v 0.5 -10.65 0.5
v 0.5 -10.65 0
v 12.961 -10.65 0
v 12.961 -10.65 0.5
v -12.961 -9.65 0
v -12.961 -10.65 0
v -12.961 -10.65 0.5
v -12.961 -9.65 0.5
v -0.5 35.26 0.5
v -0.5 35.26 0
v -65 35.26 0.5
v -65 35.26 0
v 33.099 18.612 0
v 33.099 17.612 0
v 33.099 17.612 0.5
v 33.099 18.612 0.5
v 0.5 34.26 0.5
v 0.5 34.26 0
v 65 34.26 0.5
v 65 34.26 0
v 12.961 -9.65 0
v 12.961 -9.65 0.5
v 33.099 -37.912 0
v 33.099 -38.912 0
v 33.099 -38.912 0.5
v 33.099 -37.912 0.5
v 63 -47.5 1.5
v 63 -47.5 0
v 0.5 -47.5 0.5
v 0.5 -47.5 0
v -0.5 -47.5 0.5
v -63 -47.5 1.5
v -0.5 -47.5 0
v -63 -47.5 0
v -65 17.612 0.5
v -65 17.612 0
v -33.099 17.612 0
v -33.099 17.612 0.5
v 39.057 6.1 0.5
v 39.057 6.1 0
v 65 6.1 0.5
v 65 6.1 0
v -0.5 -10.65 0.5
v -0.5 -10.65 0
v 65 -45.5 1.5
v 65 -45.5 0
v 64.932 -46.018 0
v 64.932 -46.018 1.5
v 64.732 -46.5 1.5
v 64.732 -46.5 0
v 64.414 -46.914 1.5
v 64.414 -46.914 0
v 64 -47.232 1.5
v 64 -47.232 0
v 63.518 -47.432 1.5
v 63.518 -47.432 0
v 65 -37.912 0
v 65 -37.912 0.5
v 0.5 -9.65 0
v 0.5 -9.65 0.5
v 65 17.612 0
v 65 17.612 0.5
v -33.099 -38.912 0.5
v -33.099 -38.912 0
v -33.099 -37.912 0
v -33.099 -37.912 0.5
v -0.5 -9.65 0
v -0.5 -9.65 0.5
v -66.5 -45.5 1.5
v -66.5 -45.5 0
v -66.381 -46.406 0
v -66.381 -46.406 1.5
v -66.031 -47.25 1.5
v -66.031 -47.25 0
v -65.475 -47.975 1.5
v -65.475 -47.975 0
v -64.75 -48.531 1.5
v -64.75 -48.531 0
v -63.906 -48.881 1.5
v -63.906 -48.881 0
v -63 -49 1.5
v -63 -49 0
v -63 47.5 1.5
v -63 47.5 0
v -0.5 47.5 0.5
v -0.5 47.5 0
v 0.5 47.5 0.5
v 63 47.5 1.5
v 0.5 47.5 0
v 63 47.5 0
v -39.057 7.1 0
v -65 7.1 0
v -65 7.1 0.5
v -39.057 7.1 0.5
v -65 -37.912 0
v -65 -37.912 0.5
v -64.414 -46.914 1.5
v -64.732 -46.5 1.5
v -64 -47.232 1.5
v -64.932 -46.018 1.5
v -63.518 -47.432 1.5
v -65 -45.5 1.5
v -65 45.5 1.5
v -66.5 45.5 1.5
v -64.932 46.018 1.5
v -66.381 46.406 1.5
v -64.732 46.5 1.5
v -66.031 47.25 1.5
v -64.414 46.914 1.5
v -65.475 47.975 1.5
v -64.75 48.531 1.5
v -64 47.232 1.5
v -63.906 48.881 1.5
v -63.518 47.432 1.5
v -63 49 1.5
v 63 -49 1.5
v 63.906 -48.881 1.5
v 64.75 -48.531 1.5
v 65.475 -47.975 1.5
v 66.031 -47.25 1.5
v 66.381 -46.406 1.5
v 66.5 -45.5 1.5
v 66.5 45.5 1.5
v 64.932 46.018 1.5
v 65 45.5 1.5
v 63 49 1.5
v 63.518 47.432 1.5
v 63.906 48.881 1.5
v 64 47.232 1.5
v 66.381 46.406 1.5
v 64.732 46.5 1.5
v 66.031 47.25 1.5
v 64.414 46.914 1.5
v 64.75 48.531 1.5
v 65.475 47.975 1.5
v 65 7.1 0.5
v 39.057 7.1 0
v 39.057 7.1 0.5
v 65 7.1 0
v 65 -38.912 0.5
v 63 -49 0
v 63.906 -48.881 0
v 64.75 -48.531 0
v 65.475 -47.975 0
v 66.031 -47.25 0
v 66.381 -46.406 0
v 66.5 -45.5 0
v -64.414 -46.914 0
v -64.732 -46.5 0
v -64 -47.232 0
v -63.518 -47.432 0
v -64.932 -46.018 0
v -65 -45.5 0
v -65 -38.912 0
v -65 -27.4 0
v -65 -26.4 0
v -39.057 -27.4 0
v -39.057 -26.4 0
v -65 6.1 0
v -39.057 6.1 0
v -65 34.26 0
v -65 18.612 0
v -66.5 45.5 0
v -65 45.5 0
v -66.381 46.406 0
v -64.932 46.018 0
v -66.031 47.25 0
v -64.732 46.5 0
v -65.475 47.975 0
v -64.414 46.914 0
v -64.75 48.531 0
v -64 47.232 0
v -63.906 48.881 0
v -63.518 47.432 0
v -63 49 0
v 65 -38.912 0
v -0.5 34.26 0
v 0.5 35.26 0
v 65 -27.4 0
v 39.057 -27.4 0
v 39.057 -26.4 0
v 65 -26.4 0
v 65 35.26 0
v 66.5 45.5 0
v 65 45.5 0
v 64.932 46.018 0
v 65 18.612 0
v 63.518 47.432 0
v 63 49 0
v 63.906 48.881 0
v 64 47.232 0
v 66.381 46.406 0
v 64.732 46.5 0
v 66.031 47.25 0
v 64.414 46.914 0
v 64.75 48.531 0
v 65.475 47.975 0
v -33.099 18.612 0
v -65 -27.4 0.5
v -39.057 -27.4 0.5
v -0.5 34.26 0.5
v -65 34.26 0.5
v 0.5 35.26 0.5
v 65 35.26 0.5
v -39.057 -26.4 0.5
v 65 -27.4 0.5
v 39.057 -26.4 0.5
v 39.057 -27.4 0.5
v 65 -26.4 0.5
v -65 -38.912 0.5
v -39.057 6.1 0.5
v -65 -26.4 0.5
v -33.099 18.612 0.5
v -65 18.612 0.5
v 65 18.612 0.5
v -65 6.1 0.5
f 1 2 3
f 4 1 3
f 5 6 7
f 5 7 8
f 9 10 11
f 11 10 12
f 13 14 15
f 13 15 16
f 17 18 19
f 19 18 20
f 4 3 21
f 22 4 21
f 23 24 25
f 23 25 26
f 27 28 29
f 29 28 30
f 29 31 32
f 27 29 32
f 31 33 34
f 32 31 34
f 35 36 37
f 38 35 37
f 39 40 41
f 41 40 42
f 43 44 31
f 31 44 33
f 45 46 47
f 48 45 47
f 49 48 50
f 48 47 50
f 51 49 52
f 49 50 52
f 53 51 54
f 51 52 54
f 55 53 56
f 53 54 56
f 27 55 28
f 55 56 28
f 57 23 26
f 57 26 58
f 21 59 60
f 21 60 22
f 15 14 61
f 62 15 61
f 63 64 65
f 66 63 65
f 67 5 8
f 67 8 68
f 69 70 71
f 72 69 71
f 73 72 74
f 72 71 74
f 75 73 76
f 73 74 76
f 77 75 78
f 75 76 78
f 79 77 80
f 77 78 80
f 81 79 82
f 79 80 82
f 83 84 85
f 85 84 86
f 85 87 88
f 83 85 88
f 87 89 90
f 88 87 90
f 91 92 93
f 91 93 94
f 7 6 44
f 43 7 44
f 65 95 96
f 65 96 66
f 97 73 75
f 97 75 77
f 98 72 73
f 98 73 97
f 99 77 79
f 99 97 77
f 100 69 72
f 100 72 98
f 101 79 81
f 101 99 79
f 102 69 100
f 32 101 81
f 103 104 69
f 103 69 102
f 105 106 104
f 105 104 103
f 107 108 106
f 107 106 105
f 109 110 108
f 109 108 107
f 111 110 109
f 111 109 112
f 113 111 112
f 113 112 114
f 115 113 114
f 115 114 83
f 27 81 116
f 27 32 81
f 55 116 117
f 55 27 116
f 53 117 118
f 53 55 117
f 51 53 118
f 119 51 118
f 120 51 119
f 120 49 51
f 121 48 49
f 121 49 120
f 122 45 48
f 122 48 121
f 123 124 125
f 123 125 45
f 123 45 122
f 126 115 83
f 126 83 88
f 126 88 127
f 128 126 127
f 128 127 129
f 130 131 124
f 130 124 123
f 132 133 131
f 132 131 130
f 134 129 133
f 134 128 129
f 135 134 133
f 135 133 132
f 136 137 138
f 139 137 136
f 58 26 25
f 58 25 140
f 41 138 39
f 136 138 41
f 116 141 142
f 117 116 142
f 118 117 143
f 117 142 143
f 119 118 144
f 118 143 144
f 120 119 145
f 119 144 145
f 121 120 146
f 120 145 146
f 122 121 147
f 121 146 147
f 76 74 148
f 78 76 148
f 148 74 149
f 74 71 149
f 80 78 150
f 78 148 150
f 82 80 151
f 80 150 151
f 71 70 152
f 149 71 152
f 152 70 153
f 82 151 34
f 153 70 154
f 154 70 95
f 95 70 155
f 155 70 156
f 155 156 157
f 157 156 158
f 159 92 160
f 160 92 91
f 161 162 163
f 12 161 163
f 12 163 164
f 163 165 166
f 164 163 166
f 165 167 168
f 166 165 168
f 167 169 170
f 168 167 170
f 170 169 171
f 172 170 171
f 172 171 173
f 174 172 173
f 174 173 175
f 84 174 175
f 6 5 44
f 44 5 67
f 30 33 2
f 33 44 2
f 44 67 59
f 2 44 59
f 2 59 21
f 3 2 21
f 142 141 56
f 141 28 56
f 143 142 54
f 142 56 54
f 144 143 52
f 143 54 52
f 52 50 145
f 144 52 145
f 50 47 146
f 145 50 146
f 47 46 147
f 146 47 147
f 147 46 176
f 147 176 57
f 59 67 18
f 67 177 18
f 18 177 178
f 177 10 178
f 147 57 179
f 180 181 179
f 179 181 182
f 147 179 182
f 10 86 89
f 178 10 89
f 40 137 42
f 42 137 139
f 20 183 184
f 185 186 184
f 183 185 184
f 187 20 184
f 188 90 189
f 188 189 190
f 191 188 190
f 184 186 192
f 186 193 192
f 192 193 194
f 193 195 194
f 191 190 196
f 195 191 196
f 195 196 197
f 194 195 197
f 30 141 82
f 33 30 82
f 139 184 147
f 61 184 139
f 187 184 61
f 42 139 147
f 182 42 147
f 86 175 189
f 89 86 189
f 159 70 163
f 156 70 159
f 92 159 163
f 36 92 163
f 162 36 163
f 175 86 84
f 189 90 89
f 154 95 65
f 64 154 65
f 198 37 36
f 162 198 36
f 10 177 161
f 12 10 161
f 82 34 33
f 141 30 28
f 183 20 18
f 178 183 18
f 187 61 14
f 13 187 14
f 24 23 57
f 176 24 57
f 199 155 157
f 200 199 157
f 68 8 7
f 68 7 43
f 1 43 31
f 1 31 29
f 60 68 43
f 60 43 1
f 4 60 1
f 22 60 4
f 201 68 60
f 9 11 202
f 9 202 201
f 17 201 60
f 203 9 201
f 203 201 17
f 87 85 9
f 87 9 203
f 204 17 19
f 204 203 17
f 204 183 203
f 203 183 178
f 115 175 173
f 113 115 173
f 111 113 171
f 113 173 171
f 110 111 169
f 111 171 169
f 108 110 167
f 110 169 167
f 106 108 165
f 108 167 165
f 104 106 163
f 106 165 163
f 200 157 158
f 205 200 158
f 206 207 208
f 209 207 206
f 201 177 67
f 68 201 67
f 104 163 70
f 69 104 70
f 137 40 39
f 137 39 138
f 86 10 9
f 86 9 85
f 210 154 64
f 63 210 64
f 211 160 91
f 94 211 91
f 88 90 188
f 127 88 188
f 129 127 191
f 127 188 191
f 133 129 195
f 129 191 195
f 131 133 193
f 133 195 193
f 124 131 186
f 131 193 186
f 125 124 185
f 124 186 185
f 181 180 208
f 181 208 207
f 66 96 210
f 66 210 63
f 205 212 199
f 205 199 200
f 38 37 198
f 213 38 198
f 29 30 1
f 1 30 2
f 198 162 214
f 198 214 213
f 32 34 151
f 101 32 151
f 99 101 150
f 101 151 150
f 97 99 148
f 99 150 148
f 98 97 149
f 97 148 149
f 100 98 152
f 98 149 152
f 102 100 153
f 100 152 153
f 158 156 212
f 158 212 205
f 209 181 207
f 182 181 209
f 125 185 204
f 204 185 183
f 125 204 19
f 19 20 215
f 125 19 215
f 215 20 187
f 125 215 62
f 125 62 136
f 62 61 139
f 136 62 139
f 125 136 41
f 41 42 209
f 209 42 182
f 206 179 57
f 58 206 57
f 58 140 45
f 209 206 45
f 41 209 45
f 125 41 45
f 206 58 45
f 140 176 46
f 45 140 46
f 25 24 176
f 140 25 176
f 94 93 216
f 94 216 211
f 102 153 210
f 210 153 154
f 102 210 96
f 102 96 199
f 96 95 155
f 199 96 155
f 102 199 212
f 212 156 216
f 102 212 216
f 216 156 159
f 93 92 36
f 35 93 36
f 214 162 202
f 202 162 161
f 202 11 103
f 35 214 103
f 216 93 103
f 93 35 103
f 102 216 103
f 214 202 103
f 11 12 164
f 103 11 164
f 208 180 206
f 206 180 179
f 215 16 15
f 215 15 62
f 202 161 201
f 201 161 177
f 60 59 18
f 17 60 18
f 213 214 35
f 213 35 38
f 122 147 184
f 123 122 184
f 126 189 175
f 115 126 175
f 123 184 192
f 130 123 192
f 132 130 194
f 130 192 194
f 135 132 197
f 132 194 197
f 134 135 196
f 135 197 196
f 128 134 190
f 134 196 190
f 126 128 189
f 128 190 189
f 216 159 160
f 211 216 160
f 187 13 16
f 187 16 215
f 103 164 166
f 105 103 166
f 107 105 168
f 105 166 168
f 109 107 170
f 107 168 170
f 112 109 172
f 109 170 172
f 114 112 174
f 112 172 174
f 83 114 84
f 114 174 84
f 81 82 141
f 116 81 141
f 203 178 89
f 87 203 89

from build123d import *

# Parameters (mm, degrees)
F1_DEPTH = 1.5
F0_W     = 64.5
F0_H     = 1
F0_W_2   = 1
F0_W_3   = 31.9007062912
F0_H_2   = 12.2398320138
F0_W_4   = 25.9428420663
F0_W_5   = 12.4608716816
F2_DEPTH = 0.5


with BuildPart() as f1:
    # F0 (on Top) → F1 (new body)
    with BuildSketch(Plane.XY):
        with BuildLine():
            Line((-63, -49), (63, -49))
            ThreePointArc((63, -49), (65.4748737342, -47.9748737342), (66.5, -45.5))
            Line((66.5, -45.5), (66.5, 45.5))
            ThreePointArc((66.5, 45.5), (65.4748737342, 47.9748737342), (63, 49))
            Line((63, 49), (-63, 49))
            ThreePointArc((-63, 49), (-65.4748737342, 47.9748737342), (-66.5, 45.5))
            Line((-66.5, 45.5), (-66.5, -45.5))
            ThreePointArc((-66.5, -45.5), (-65.4748737342, -47.9748737342), (-63, -49))
        make_face()
        with BuildLine():
            Line((0.5, 47.5), (63, 47.5))
            ThreePointArc((63, 47.5), (64.4142135624, 46.9142135624), (65, 45.5))
            Line((65, 45.5), (65, 35.2601679862))
            Line((65, 35.2601679862), (65, 34.2601679862))
            Line((65, 34.2601679862), (65, 18.6124684513))
            Line((65, 18.6124684513), (65, 17.6124684513))
            Line((65, 17.6124684513), (65, 7.1))
            Line((65, 7.1), (65, 6.1))
            Line((65, 6.1), (65, -26.4))
            Line((65, -26.4), (65, -27.4))
            Line((65, -27.4), (65, -37.9124684513))
            Line((65, -37.9124684513), (65, -38.9124684513))
            Line((65, -38.9124684513), (65, -45.5))
            ThreePointArc((65, -45.5), (64.4142135624, -46.9142135624), (63, -47.5))
            Line((63, -47.5), (0.5, -47.5))
            Line((0.5, -47.5), (-0.5, -47.5))
            Line((-0.5, -47.5), (-63, -47.5))
            ThreePointArc((-63, -47.5), (-64.4142135624, -46.9142135624), (-65, -45.5))
            Line((-65, -45.5), (-65, -38.9124684513))
            Line((-65, -38.9124684513), (-65, -37.9124684513))
            Line((-65, -37.9124684513), (-65, -27.4))
            Line((-65, -27.4), (-65, -26.4))
            Line((-65, -26.4), (-65, 6.1))
            Line((-65, 6.1), (-65, 7.1))
            Line((-65, 7.1), (-65, 17.6124684513))
            Line((-65, 17.6124684513), (-65, 18.6124684513))
            Line((-65, 18.6124684513), (-65, 34.2601679862))
            Line((-65, 34.2601679862), (-65, 35.2601679862))
            Line((-65, 35.2601679862), (-65, 45.5))
            ThreePointArc((-65, 45.5), (-64.4142135624, 46.9142135624), (-63, 47.5))
            Line((-63, 47.5), (-0.5, 47.5))
            Line((-0.5, 47.5), (0.5, 47.5))
        make_face(mode=Mode.SUBTRACT)
    extrude(amount=F1_DEPTH)

    # F0 (on Top) → F2 (join)
    with BuildSketch(Plane.XY):
        with Locations((-32.75, 34.7601679862)):
            Rectangle(F0_W, F0_H)
        with Locations((0, 34.7601679862)):
            Rectangle(F0_W_2, F0_H)
        with Locations((32.75, 34.7601679862)):
            Rectangle(F0_W, F0_H)
        with Locations((49.0496468544, 18.1124684513)):
            Rectangle(F0_W_3, F0_H)
        Polygon((0.5, -9.65), (0.5, 34.2601679862), (-0.5, 34.2601679862), (-0.5, -9.65), (-0.5, -10.65), (-0.5, -47.5), (0.5, -47.5), (0.5, -10.65), align=None)
        with Locations((0, 41.3800839931)):
            Rectangle(F0_W_2, F0_H_2)
        with Locations((-49.0496468544, 18.1124684513)):
            Rectangle(F0_W_3, F0_H)
        with Locations((52.0285789669, 6.6)):
            Rectangle(F0_W_4, F0_H)
        with Locations((52.0285789669, -26.9)):
            Rectangle(F0_W_4, F0_H)
        with Locations((6.7304358408, -10.15)):
            Rectangle(F0_W_5, F0_H)
        with Locations((-52.0285789669, 6.6)):
            Rectangle(F0_W_4, F0_H)
        with Locations((-6.7304358408, -10.15)):
            Rectangle(F0_W_5, F0_H)
        with Locations((-52.0285789669, -26.9)):
            Rectangle(F0_W_4, F0_H)
        with Locations((-49.0496468544, -38.4124684513)):
            Rectangle(F0_W_3, F0_H)
        with Locations((49.0496468544, -38.4124684513)):
            Rectangle(F0_W_3, F0_H)
    extrude(amount=F2_DEPTH)


solid = f1.part
